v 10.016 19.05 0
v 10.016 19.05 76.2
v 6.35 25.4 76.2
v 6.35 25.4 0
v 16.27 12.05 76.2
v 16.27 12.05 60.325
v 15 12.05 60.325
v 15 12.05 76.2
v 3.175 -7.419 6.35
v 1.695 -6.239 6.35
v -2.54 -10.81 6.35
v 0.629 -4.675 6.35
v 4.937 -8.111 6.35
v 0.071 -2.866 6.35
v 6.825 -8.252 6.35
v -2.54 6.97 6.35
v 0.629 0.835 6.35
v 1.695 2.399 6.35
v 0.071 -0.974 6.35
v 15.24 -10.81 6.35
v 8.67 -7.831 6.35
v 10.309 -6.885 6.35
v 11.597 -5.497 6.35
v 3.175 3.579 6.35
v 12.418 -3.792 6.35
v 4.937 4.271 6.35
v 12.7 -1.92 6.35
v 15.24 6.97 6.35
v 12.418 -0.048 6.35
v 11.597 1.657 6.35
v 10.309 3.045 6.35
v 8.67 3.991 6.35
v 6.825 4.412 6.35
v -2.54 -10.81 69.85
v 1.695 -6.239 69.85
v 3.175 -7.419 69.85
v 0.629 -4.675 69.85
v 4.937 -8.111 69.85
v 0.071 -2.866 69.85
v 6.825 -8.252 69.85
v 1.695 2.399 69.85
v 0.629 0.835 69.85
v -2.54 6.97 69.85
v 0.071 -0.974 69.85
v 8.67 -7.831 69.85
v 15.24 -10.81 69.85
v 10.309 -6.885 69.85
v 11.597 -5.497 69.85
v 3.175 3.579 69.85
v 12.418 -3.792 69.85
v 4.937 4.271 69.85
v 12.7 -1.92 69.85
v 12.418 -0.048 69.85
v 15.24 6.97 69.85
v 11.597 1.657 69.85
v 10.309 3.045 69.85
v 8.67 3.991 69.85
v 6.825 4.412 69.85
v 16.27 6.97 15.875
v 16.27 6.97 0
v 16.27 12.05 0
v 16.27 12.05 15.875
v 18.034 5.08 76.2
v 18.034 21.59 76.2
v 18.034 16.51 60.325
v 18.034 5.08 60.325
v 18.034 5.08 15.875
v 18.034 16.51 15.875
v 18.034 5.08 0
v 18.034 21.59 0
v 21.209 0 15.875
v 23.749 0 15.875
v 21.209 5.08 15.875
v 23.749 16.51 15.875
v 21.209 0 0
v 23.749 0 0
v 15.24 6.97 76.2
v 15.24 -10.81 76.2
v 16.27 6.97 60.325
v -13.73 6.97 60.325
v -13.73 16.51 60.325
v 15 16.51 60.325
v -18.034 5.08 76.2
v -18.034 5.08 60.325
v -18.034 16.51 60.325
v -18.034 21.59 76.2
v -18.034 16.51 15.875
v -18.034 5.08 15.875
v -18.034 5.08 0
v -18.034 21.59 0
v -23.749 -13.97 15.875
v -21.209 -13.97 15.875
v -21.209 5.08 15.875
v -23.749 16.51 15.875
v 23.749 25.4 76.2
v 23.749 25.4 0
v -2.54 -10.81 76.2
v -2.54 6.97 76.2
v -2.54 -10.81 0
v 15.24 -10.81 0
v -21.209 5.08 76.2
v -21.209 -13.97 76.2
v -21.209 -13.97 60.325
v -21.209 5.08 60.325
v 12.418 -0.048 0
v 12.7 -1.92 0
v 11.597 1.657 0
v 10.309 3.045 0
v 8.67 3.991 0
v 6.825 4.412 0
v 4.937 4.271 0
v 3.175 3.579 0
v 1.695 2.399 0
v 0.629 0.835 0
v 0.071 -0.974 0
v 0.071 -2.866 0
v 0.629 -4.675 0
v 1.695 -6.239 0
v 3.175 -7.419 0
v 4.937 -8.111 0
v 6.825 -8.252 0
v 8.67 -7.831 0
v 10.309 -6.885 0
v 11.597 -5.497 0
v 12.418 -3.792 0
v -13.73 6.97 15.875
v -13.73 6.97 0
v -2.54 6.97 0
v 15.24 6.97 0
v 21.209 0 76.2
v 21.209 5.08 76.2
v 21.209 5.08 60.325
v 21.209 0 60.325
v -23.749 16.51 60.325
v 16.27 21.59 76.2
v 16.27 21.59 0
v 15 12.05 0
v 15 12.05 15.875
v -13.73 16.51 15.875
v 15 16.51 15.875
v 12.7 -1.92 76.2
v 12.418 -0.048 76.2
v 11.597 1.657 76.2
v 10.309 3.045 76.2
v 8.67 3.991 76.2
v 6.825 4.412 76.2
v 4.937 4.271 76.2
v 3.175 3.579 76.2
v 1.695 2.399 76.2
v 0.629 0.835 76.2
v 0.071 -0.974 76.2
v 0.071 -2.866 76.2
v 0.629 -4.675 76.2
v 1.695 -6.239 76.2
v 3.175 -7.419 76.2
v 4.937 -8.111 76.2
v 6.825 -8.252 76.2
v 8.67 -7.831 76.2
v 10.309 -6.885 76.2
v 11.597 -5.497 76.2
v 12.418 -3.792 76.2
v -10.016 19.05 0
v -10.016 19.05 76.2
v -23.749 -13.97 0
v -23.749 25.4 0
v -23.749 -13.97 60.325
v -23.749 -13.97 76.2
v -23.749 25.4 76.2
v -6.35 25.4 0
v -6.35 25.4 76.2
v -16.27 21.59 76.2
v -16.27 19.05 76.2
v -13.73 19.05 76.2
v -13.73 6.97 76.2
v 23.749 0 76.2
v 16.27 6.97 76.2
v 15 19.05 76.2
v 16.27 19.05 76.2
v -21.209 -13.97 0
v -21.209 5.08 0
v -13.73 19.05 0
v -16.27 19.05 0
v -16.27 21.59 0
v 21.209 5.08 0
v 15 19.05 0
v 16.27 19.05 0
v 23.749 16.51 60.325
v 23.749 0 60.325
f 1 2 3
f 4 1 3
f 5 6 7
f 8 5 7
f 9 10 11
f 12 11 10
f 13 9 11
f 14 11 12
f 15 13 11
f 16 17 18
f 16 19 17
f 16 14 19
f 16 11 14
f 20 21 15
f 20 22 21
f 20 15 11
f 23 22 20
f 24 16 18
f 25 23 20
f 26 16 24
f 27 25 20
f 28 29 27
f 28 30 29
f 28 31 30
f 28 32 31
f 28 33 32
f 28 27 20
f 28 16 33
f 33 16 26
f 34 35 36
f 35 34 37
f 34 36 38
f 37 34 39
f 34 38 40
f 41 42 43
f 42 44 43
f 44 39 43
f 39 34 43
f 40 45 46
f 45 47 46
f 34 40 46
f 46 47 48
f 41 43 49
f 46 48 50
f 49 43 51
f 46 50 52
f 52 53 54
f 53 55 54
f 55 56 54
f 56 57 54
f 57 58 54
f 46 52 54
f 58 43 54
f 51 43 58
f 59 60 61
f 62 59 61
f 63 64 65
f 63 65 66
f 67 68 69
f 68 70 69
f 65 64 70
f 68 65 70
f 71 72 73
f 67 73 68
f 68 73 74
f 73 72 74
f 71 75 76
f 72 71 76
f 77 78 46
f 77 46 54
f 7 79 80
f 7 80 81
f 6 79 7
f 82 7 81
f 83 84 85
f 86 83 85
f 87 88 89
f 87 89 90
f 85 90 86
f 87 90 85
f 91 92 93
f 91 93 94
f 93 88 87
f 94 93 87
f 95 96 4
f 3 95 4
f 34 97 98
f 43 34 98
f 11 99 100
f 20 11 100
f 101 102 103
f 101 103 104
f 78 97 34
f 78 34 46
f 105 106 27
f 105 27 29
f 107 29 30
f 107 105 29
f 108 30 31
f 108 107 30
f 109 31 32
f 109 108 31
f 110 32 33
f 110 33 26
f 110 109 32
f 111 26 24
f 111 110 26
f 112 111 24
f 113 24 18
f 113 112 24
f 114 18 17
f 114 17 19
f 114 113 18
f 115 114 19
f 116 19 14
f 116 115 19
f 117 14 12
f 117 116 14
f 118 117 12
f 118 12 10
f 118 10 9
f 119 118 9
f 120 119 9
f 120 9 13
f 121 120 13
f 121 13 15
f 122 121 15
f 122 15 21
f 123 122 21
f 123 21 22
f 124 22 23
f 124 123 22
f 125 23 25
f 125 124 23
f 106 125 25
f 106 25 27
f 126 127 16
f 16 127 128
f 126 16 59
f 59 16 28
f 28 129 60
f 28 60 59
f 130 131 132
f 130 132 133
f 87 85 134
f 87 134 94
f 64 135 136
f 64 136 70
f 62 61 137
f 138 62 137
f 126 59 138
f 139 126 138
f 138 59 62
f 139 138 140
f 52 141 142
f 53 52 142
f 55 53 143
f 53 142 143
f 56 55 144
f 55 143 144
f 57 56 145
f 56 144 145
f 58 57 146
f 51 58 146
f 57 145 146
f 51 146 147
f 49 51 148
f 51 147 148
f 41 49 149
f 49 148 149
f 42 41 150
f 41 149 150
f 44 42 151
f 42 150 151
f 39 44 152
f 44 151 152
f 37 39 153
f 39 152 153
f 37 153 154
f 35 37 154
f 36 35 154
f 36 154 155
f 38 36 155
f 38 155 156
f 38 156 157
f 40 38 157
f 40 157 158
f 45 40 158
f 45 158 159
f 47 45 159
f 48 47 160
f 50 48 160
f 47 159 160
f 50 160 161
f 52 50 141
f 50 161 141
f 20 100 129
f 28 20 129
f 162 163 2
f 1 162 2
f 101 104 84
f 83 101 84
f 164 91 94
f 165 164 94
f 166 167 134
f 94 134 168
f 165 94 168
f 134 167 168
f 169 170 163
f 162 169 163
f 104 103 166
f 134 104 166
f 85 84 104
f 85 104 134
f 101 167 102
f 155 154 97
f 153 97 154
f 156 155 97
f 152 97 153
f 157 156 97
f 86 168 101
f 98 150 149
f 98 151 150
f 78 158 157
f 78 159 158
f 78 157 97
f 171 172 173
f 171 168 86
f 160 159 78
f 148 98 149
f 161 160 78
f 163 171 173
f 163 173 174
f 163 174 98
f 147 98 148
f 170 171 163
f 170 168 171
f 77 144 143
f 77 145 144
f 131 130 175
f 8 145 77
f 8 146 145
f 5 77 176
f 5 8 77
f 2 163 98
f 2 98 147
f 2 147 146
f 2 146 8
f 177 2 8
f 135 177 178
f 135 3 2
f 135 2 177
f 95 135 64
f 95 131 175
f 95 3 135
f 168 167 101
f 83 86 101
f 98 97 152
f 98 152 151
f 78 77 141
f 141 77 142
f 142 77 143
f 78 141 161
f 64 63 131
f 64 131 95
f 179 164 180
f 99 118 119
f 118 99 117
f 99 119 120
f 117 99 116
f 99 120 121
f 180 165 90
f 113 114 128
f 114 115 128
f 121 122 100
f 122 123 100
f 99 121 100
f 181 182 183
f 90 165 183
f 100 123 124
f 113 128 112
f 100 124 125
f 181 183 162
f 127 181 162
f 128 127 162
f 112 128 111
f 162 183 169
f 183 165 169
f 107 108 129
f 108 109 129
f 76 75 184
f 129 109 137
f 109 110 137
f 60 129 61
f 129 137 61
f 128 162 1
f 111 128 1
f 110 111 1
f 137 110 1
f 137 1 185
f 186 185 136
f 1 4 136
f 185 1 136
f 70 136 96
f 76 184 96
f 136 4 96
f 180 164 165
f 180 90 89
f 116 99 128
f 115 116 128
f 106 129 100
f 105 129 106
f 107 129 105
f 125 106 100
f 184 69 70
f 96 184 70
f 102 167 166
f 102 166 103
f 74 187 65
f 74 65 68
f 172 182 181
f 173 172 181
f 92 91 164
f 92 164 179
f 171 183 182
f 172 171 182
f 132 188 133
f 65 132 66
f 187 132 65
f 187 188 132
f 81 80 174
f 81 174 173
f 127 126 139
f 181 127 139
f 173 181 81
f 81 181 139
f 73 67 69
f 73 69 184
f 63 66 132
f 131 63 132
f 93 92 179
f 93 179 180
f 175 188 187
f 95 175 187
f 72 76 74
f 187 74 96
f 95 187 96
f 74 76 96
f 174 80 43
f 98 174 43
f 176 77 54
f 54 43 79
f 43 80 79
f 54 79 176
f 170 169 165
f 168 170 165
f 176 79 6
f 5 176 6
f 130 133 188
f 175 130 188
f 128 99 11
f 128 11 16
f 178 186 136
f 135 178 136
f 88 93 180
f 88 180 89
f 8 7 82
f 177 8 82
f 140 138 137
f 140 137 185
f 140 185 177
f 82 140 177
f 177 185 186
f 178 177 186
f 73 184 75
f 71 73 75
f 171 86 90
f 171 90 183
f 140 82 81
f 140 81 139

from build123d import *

# Parameters (mm, degrees)
BOSS_EXTRUDE1_DEPTH = 76.2
SKETCH2_W           = 2.54
SKETCH2_H           = 19.05
BOSS_EXTRUDE2_DEPTH = 76.2
SKETCH3_W           = 17.78
SKETCH3_H           = 17.78
SKETCH3_R           = 6.35
BOSS_EXTRUDE3_DEPTH = 6.35
CUT_EXTRUDE1_DEPTH  = 84.75926815
SKETCH5_W           = 44.45
SKETCH5_H           = 30.48
CUT_EXTRUDE2_DEPTH  = 94.314843428
CUT_EXTRUDE3_START  = -76.2
SKETCH6_W           = 2.54
SKETCH6_H           = 12.08
CUT_EXTRUDE3_DEPTH  = 76.2


with BuildPart() as part:
    # Sketch1 → Boss-Extrude1 (new body)
    with BuildSketch(Plane.XY):
        Polygon((-16.27, 6.97), (16.27, 6.97), (16.27, 12.05), (15, 12.05), (15, 19.05), (16.27, 19.05), (16.27, 21.59), (18.034, 21.59), (18.034, 5.08), (21.209, 5.08), (21.209, 0), (23.749, 0), (23.749, 25.4), (-23.749, 25.4), (-23.749, 0), (-21.209, 0), (-21.209, 5.08), (-18.034, 5.08), (-18.034, 21.59), (-16.27, 21.59), (-16.27, 19.05), (-15, 19.05), (-15, 12.05), (-16.27, 12.05), align=None)
    extrude(amount=BOSS_EXTRUDE1_DEPTH)

    # Sketch2 → Boss-Extrude2 (add)
    with BuildSketch(Plane.XY.offset(76.2)):
        with Locations((-22.479, -4.445)):
            Rectangle(SKETCH2_W, SKETCH2_H)
    extrude(amount=-BOSS_EXTRUDE2_DEPTH)

    # Sketch3 → Boss-Extrude3 (add)
    with BuildSketch(Plane.XY.offset(76.2)):
        with Locations((6.35, -1.92)):
            Rectangle(SKETCH3_W, SKETCH3_H)
        with Locations((6.35, -1.92)):
            Circle(SKETCH3_R, mode=Mode.SUBTRACT)
    boss_extrude3 = extrude(amount=-BOSS_EXTRUDE3_DEPTH)

    # Mirror1: Boss-Extrude3 across plane
    add(boss_extrude3.mirror(Plane.XY.offset(38.1)))

    # Sketch4 → Cut-Extrude1 (cut, through all)
    with BuildSketch(Plane.XY.offset(76.2)):
        Polygon((-6.35, 25.4), (-10.016174209, 19.05), (10.016174209, 19.05), (6.35, 25.4), align=None)
    extrude(amount=-CUT_EXTRUDE1_DEPTH, mode=Mode.SUBTRACT)

    # Sketch5 → Cut-Extrude2 (cut, through all)
    with BuildSketch(Plane(origin=(23.749, 0, 0), x_dir=(0, 0, -1), z_dir=(1, 0, 0))):
        with Locations((-38.1, 1.27)):
            Rectangle(SKETCH5_W, SKETCH5_H)
    extrude(amount=-CUT_EXTRUDE2_DEPTH, mode=Mode.SUBTRACT)

    # Sketch6 → Cut-Extrude3 (cut)
    with BuildSketch(Plane.XY.offset(76.2).offset(CUT_EXTRUDE3_START)):
        with Locations((-15, 13.01)):
            Rectangle(SKETCH6_W, SKETCH6_H)
    extrude(amount=CUT_EXTRUDE3_DEPTH, mode=Mode.SUBTRACT)


solid = part.part
